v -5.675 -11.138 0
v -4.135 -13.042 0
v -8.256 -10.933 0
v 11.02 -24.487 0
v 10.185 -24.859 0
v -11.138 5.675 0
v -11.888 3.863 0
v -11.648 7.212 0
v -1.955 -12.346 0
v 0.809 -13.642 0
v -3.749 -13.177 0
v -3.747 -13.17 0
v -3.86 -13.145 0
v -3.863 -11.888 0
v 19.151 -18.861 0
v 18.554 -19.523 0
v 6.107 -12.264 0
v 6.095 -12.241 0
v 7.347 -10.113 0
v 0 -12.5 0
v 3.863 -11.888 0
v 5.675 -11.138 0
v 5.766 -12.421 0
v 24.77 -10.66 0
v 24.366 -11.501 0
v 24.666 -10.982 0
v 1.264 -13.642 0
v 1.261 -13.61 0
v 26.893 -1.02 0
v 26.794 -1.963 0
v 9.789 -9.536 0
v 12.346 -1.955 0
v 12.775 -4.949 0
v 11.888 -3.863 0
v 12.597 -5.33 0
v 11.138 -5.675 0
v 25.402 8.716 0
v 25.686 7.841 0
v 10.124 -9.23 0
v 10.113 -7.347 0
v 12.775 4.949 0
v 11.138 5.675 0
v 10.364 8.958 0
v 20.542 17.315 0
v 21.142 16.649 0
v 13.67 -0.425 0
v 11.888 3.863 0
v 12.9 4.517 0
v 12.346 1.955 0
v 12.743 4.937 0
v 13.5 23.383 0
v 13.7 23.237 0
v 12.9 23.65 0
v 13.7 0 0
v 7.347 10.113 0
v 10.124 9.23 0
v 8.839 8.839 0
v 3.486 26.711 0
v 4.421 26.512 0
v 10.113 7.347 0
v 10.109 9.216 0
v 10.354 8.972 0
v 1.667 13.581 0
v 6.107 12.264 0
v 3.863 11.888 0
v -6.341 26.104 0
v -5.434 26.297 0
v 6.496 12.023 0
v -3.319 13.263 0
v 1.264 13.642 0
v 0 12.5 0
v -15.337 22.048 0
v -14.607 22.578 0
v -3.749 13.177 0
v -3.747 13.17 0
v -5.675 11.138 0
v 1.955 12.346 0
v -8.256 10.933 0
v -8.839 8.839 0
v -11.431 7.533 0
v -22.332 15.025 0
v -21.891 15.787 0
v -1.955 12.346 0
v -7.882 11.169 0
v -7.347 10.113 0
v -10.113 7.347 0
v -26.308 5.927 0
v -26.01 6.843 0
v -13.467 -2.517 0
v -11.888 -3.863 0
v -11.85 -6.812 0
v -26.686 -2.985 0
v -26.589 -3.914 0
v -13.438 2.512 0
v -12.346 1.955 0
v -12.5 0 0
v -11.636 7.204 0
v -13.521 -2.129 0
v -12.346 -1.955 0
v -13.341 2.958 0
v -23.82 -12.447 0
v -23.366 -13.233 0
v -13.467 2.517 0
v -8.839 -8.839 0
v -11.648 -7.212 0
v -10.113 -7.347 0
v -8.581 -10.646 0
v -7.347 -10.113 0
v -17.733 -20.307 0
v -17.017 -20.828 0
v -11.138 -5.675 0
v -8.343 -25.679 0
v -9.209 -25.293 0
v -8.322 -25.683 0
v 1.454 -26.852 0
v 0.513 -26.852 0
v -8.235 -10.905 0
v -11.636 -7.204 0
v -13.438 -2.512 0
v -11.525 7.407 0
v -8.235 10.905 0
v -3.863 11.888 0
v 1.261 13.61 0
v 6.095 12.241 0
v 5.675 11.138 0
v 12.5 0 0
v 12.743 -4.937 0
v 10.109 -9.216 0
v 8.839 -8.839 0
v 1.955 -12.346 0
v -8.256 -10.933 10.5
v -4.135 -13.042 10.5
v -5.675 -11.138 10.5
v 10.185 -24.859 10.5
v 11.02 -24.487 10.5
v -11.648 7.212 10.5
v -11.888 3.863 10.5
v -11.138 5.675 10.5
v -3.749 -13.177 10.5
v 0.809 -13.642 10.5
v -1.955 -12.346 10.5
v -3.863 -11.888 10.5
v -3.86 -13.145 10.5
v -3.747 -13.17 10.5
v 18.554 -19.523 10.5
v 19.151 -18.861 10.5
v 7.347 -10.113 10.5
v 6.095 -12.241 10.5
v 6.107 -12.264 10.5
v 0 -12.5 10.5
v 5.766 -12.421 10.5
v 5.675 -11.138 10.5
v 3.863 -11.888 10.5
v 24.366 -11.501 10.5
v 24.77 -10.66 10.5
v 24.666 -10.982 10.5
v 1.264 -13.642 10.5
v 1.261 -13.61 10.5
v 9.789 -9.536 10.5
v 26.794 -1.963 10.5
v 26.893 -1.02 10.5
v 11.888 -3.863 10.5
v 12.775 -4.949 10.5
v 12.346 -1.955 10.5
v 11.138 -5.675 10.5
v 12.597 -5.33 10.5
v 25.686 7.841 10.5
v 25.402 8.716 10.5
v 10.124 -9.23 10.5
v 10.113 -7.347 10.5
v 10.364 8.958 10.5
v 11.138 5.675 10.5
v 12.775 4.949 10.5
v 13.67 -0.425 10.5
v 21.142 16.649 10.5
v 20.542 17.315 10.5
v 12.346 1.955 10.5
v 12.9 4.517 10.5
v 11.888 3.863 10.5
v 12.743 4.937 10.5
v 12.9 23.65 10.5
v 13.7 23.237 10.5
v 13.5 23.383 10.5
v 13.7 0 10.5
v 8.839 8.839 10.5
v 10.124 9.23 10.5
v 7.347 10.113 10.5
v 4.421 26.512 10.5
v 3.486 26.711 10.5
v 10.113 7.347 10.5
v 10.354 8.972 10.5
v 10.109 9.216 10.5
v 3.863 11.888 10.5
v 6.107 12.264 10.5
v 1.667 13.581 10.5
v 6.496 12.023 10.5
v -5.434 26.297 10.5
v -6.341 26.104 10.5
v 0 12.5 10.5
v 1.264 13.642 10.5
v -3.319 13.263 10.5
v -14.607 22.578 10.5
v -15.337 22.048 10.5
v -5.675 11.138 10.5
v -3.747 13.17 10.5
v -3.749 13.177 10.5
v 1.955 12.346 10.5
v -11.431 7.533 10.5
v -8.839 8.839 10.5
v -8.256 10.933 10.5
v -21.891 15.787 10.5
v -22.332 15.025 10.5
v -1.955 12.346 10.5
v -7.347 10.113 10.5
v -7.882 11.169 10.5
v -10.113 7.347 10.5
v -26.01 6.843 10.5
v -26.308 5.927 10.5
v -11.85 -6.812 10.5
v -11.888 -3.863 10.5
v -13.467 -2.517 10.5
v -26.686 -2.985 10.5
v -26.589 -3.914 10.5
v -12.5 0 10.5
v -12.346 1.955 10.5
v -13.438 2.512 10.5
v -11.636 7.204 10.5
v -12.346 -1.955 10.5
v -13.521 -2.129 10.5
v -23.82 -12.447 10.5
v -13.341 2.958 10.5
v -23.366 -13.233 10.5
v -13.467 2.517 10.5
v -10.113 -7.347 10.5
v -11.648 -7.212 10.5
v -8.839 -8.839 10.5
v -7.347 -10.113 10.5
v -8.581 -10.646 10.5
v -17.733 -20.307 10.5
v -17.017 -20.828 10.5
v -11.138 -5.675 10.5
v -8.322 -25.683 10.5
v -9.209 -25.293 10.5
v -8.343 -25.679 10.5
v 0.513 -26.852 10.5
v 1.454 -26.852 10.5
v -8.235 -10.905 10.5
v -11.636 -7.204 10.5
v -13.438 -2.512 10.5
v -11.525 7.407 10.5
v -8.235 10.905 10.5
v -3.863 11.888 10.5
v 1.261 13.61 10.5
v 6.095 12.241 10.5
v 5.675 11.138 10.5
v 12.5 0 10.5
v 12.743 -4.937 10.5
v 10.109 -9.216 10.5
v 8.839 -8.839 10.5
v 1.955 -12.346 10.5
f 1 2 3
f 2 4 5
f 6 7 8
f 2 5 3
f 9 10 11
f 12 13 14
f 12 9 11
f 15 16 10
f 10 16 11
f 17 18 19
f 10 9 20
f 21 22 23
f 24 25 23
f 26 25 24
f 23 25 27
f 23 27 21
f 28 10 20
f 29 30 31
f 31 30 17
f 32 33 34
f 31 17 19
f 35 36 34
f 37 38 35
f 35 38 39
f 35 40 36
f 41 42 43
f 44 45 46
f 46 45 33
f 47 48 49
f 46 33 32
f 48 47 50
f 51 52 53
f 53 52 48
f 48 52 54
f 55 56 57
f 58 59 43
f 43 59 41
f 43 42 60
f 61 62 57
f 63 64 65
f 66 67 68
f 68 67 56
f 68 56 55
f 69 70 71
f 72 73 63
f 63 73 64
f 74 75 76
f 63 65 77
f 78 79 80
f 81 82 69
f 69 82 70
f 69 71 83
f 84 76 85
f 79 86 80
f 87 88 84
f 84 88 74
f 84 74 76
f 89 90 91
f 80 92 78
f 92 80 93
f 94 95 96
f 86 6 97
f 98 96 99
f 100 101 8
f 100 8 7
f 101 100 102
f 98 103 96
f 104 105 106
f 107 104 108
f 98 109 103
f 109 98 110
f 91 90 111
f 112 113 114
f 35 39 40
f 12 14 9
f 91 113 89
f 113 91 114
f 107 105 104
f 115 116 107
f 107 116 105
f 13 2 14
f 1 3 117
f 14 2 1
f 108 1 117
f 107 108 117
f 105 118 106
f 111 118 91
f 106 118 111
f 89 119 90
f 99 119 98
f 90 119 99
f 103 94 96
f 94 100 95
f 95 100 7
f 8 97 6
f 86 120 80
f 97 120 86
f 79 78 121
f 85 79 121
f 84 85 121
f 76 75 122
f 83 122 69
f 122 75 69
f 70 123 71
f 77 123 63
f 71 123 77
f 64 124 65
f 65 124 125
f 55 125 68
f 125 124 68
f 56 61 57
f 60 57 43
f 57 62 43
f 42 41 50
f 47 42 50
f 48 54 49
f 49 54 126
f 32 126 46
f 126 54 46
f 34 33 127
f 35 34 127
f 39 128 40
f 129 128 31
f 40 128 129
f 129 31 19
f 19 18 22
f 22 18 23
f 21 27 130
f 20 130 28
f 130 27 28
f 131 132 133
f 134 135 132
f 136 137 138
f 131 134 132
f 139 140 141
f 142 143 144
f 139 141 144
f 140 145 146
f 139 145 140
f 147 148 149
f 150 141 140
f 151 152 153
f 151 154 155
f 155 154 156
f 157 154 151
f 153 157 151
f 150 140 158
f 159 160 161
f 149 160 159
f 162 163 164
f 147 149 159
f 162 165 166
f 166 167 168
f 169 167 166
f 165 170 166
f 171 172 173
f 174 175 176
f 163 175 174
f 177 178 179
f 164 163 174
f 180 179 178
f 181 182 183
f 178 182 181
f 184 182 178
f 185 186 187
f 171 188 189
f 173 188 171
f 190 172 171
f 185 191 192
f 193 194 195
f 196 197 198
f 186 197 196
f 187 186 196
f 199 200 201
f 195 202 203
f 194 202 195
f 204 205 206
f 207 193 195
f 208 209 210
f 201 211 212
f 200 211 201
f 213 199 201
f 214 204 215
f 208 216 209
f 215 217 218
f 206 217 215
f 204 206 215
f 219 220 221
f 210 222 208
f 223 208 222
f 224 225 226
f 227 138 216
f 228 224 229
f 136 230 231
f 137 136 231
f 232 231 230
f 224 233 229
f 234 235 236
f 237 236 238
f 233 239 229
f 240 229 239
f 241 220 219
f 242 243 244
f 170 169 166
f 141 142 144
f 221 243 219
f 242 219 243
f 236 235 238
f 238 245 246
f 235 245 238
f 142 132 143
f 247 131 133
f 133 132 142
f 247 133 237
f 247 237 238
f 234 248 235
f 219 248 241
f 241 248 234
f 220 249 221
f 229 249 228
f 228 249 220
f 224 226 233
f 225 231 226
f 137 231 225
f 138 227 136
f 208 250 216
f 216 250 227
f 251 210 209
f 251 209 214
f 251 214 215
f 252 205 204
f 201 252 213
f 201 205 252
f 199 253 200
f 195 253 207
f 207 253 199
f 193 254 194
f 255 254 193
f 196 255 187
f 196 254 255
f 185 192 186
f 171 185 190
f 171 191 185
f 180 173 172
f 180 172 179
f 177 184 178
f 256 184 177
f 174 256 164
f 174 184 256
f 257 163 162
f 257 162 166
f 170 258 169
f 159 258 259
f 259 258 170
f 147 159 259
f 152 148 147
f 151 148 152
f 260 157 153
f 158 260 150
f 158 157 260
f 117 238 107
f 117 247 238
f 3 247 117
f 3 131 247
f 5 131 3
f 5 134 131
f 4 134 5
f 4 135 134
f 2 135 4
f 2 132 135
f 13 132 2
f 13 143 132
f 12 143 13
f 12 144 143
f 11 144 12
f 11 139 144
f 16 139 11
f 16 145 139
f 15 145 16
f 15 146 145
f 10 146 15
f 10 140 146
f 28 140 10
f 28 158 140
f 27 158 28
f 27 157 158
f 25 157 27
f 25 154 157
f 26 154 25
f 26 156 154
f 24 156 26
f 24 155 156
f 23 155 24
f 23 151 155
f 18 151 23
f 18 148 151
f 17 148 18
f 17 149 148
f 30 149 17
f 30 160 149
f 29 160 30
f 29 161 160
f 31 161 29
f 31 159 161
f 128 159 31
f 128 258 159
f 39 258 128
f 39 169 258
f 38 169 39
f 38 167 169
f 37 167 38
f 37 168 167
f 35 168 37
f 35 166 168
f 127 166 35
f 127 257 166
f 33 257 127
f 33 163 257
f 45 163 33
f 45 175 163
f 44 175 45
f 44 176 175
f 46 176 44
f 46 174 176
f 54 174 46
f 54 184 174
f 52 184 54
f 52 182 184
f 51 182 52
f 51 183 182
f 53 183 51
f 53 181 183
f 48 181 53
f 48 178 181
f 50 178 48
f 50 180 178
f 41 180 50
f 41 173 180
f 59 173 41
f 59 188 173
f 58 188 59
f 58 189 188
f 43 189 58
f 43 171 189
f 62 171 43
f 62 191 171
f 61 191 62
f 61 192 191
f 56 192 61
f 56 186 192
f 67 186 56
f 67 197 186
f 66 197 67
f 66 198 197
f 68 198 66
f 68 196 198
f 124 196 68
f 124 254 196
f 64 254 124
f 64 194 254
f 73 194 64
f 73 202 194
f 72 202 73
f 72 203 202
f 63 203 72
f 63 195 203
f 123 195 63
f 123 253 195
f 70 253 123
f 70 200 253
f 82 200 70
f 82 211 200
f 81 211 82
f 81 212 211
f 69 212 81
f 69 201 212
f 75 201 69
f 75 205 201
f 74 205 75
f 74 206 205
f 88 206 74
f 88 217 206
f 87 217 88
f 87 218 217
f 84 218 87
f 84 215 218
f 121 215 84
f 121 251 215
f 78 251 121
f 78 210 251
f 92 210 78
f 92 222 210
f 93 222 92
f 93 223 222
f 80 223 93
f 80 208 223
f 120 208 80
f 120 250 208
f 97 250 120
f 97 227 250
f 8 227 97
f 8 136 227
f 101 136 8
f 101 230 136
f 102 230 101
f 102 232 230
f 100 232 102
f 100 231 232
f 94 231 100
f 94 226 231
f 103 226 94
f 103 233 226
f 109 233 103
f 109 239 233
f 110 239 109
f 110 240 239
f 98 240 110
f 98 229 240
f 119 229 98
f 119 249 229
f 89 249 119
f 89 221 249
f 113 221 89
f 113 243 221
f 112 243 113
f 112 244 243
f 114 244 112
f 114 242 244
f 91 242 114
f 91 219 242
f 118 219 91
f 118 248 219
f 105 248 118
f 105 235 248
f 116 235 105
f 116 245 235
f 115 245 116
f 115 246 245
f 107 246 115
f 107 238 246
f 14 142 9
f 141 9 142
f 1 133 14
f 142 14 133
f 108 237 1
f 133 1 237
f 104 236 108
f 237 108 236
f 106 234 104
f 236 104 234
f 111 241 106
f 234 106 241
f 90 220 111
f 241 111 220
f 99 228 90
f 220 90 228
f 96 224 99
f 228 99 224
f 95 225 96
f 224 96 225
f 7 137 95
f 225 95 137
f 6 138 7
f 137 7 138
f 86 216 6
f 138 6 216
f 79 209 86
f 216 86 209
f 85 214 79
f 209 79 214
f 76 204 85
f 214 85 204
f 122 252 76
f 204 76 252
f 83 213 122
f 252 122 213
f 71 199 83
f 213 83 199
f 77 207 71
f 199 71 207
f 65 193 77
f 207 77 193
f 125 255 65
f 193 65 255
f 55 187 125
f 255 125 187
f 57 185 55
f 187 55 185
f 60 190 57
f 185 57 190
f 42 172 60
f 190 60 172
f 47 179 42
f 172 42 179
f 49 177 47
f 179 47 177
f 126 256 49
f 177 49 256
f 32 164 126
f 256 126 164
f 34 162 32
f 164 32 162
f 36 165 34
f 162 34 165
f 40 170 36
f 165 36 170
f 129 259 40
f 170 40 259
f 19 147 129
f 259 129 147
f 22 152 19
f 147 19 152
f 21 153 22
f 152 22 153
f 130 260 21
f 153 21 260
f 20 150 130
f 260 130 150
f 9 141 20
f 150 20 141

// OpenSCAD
height = 10.5;
hubInnerDiameter = 25.0;
hubThickness = 1.2;
outerDiameter = 54.0;
bladeThickness = 0.8;
blades = 17;

fan();

module fan() {
    linear_extrude(height=height) union() {
        difference() {
            circle(hubInnerDiameter/2 + hubThickness, $fa=4);
            circle(hubInnerDiameter/2, $fa=4);
        }
        intersection() {
            for (s=[1:blades]) {
                rotate([0, 0, 360/blades * s]) translate([hubInnerDiameter/2 + hubThickness - bladeThickness, 0]) square([bladeThickness, outerDiameter], center=false);
            }
            circle(outerDiameter/2);
        }
    }
}
